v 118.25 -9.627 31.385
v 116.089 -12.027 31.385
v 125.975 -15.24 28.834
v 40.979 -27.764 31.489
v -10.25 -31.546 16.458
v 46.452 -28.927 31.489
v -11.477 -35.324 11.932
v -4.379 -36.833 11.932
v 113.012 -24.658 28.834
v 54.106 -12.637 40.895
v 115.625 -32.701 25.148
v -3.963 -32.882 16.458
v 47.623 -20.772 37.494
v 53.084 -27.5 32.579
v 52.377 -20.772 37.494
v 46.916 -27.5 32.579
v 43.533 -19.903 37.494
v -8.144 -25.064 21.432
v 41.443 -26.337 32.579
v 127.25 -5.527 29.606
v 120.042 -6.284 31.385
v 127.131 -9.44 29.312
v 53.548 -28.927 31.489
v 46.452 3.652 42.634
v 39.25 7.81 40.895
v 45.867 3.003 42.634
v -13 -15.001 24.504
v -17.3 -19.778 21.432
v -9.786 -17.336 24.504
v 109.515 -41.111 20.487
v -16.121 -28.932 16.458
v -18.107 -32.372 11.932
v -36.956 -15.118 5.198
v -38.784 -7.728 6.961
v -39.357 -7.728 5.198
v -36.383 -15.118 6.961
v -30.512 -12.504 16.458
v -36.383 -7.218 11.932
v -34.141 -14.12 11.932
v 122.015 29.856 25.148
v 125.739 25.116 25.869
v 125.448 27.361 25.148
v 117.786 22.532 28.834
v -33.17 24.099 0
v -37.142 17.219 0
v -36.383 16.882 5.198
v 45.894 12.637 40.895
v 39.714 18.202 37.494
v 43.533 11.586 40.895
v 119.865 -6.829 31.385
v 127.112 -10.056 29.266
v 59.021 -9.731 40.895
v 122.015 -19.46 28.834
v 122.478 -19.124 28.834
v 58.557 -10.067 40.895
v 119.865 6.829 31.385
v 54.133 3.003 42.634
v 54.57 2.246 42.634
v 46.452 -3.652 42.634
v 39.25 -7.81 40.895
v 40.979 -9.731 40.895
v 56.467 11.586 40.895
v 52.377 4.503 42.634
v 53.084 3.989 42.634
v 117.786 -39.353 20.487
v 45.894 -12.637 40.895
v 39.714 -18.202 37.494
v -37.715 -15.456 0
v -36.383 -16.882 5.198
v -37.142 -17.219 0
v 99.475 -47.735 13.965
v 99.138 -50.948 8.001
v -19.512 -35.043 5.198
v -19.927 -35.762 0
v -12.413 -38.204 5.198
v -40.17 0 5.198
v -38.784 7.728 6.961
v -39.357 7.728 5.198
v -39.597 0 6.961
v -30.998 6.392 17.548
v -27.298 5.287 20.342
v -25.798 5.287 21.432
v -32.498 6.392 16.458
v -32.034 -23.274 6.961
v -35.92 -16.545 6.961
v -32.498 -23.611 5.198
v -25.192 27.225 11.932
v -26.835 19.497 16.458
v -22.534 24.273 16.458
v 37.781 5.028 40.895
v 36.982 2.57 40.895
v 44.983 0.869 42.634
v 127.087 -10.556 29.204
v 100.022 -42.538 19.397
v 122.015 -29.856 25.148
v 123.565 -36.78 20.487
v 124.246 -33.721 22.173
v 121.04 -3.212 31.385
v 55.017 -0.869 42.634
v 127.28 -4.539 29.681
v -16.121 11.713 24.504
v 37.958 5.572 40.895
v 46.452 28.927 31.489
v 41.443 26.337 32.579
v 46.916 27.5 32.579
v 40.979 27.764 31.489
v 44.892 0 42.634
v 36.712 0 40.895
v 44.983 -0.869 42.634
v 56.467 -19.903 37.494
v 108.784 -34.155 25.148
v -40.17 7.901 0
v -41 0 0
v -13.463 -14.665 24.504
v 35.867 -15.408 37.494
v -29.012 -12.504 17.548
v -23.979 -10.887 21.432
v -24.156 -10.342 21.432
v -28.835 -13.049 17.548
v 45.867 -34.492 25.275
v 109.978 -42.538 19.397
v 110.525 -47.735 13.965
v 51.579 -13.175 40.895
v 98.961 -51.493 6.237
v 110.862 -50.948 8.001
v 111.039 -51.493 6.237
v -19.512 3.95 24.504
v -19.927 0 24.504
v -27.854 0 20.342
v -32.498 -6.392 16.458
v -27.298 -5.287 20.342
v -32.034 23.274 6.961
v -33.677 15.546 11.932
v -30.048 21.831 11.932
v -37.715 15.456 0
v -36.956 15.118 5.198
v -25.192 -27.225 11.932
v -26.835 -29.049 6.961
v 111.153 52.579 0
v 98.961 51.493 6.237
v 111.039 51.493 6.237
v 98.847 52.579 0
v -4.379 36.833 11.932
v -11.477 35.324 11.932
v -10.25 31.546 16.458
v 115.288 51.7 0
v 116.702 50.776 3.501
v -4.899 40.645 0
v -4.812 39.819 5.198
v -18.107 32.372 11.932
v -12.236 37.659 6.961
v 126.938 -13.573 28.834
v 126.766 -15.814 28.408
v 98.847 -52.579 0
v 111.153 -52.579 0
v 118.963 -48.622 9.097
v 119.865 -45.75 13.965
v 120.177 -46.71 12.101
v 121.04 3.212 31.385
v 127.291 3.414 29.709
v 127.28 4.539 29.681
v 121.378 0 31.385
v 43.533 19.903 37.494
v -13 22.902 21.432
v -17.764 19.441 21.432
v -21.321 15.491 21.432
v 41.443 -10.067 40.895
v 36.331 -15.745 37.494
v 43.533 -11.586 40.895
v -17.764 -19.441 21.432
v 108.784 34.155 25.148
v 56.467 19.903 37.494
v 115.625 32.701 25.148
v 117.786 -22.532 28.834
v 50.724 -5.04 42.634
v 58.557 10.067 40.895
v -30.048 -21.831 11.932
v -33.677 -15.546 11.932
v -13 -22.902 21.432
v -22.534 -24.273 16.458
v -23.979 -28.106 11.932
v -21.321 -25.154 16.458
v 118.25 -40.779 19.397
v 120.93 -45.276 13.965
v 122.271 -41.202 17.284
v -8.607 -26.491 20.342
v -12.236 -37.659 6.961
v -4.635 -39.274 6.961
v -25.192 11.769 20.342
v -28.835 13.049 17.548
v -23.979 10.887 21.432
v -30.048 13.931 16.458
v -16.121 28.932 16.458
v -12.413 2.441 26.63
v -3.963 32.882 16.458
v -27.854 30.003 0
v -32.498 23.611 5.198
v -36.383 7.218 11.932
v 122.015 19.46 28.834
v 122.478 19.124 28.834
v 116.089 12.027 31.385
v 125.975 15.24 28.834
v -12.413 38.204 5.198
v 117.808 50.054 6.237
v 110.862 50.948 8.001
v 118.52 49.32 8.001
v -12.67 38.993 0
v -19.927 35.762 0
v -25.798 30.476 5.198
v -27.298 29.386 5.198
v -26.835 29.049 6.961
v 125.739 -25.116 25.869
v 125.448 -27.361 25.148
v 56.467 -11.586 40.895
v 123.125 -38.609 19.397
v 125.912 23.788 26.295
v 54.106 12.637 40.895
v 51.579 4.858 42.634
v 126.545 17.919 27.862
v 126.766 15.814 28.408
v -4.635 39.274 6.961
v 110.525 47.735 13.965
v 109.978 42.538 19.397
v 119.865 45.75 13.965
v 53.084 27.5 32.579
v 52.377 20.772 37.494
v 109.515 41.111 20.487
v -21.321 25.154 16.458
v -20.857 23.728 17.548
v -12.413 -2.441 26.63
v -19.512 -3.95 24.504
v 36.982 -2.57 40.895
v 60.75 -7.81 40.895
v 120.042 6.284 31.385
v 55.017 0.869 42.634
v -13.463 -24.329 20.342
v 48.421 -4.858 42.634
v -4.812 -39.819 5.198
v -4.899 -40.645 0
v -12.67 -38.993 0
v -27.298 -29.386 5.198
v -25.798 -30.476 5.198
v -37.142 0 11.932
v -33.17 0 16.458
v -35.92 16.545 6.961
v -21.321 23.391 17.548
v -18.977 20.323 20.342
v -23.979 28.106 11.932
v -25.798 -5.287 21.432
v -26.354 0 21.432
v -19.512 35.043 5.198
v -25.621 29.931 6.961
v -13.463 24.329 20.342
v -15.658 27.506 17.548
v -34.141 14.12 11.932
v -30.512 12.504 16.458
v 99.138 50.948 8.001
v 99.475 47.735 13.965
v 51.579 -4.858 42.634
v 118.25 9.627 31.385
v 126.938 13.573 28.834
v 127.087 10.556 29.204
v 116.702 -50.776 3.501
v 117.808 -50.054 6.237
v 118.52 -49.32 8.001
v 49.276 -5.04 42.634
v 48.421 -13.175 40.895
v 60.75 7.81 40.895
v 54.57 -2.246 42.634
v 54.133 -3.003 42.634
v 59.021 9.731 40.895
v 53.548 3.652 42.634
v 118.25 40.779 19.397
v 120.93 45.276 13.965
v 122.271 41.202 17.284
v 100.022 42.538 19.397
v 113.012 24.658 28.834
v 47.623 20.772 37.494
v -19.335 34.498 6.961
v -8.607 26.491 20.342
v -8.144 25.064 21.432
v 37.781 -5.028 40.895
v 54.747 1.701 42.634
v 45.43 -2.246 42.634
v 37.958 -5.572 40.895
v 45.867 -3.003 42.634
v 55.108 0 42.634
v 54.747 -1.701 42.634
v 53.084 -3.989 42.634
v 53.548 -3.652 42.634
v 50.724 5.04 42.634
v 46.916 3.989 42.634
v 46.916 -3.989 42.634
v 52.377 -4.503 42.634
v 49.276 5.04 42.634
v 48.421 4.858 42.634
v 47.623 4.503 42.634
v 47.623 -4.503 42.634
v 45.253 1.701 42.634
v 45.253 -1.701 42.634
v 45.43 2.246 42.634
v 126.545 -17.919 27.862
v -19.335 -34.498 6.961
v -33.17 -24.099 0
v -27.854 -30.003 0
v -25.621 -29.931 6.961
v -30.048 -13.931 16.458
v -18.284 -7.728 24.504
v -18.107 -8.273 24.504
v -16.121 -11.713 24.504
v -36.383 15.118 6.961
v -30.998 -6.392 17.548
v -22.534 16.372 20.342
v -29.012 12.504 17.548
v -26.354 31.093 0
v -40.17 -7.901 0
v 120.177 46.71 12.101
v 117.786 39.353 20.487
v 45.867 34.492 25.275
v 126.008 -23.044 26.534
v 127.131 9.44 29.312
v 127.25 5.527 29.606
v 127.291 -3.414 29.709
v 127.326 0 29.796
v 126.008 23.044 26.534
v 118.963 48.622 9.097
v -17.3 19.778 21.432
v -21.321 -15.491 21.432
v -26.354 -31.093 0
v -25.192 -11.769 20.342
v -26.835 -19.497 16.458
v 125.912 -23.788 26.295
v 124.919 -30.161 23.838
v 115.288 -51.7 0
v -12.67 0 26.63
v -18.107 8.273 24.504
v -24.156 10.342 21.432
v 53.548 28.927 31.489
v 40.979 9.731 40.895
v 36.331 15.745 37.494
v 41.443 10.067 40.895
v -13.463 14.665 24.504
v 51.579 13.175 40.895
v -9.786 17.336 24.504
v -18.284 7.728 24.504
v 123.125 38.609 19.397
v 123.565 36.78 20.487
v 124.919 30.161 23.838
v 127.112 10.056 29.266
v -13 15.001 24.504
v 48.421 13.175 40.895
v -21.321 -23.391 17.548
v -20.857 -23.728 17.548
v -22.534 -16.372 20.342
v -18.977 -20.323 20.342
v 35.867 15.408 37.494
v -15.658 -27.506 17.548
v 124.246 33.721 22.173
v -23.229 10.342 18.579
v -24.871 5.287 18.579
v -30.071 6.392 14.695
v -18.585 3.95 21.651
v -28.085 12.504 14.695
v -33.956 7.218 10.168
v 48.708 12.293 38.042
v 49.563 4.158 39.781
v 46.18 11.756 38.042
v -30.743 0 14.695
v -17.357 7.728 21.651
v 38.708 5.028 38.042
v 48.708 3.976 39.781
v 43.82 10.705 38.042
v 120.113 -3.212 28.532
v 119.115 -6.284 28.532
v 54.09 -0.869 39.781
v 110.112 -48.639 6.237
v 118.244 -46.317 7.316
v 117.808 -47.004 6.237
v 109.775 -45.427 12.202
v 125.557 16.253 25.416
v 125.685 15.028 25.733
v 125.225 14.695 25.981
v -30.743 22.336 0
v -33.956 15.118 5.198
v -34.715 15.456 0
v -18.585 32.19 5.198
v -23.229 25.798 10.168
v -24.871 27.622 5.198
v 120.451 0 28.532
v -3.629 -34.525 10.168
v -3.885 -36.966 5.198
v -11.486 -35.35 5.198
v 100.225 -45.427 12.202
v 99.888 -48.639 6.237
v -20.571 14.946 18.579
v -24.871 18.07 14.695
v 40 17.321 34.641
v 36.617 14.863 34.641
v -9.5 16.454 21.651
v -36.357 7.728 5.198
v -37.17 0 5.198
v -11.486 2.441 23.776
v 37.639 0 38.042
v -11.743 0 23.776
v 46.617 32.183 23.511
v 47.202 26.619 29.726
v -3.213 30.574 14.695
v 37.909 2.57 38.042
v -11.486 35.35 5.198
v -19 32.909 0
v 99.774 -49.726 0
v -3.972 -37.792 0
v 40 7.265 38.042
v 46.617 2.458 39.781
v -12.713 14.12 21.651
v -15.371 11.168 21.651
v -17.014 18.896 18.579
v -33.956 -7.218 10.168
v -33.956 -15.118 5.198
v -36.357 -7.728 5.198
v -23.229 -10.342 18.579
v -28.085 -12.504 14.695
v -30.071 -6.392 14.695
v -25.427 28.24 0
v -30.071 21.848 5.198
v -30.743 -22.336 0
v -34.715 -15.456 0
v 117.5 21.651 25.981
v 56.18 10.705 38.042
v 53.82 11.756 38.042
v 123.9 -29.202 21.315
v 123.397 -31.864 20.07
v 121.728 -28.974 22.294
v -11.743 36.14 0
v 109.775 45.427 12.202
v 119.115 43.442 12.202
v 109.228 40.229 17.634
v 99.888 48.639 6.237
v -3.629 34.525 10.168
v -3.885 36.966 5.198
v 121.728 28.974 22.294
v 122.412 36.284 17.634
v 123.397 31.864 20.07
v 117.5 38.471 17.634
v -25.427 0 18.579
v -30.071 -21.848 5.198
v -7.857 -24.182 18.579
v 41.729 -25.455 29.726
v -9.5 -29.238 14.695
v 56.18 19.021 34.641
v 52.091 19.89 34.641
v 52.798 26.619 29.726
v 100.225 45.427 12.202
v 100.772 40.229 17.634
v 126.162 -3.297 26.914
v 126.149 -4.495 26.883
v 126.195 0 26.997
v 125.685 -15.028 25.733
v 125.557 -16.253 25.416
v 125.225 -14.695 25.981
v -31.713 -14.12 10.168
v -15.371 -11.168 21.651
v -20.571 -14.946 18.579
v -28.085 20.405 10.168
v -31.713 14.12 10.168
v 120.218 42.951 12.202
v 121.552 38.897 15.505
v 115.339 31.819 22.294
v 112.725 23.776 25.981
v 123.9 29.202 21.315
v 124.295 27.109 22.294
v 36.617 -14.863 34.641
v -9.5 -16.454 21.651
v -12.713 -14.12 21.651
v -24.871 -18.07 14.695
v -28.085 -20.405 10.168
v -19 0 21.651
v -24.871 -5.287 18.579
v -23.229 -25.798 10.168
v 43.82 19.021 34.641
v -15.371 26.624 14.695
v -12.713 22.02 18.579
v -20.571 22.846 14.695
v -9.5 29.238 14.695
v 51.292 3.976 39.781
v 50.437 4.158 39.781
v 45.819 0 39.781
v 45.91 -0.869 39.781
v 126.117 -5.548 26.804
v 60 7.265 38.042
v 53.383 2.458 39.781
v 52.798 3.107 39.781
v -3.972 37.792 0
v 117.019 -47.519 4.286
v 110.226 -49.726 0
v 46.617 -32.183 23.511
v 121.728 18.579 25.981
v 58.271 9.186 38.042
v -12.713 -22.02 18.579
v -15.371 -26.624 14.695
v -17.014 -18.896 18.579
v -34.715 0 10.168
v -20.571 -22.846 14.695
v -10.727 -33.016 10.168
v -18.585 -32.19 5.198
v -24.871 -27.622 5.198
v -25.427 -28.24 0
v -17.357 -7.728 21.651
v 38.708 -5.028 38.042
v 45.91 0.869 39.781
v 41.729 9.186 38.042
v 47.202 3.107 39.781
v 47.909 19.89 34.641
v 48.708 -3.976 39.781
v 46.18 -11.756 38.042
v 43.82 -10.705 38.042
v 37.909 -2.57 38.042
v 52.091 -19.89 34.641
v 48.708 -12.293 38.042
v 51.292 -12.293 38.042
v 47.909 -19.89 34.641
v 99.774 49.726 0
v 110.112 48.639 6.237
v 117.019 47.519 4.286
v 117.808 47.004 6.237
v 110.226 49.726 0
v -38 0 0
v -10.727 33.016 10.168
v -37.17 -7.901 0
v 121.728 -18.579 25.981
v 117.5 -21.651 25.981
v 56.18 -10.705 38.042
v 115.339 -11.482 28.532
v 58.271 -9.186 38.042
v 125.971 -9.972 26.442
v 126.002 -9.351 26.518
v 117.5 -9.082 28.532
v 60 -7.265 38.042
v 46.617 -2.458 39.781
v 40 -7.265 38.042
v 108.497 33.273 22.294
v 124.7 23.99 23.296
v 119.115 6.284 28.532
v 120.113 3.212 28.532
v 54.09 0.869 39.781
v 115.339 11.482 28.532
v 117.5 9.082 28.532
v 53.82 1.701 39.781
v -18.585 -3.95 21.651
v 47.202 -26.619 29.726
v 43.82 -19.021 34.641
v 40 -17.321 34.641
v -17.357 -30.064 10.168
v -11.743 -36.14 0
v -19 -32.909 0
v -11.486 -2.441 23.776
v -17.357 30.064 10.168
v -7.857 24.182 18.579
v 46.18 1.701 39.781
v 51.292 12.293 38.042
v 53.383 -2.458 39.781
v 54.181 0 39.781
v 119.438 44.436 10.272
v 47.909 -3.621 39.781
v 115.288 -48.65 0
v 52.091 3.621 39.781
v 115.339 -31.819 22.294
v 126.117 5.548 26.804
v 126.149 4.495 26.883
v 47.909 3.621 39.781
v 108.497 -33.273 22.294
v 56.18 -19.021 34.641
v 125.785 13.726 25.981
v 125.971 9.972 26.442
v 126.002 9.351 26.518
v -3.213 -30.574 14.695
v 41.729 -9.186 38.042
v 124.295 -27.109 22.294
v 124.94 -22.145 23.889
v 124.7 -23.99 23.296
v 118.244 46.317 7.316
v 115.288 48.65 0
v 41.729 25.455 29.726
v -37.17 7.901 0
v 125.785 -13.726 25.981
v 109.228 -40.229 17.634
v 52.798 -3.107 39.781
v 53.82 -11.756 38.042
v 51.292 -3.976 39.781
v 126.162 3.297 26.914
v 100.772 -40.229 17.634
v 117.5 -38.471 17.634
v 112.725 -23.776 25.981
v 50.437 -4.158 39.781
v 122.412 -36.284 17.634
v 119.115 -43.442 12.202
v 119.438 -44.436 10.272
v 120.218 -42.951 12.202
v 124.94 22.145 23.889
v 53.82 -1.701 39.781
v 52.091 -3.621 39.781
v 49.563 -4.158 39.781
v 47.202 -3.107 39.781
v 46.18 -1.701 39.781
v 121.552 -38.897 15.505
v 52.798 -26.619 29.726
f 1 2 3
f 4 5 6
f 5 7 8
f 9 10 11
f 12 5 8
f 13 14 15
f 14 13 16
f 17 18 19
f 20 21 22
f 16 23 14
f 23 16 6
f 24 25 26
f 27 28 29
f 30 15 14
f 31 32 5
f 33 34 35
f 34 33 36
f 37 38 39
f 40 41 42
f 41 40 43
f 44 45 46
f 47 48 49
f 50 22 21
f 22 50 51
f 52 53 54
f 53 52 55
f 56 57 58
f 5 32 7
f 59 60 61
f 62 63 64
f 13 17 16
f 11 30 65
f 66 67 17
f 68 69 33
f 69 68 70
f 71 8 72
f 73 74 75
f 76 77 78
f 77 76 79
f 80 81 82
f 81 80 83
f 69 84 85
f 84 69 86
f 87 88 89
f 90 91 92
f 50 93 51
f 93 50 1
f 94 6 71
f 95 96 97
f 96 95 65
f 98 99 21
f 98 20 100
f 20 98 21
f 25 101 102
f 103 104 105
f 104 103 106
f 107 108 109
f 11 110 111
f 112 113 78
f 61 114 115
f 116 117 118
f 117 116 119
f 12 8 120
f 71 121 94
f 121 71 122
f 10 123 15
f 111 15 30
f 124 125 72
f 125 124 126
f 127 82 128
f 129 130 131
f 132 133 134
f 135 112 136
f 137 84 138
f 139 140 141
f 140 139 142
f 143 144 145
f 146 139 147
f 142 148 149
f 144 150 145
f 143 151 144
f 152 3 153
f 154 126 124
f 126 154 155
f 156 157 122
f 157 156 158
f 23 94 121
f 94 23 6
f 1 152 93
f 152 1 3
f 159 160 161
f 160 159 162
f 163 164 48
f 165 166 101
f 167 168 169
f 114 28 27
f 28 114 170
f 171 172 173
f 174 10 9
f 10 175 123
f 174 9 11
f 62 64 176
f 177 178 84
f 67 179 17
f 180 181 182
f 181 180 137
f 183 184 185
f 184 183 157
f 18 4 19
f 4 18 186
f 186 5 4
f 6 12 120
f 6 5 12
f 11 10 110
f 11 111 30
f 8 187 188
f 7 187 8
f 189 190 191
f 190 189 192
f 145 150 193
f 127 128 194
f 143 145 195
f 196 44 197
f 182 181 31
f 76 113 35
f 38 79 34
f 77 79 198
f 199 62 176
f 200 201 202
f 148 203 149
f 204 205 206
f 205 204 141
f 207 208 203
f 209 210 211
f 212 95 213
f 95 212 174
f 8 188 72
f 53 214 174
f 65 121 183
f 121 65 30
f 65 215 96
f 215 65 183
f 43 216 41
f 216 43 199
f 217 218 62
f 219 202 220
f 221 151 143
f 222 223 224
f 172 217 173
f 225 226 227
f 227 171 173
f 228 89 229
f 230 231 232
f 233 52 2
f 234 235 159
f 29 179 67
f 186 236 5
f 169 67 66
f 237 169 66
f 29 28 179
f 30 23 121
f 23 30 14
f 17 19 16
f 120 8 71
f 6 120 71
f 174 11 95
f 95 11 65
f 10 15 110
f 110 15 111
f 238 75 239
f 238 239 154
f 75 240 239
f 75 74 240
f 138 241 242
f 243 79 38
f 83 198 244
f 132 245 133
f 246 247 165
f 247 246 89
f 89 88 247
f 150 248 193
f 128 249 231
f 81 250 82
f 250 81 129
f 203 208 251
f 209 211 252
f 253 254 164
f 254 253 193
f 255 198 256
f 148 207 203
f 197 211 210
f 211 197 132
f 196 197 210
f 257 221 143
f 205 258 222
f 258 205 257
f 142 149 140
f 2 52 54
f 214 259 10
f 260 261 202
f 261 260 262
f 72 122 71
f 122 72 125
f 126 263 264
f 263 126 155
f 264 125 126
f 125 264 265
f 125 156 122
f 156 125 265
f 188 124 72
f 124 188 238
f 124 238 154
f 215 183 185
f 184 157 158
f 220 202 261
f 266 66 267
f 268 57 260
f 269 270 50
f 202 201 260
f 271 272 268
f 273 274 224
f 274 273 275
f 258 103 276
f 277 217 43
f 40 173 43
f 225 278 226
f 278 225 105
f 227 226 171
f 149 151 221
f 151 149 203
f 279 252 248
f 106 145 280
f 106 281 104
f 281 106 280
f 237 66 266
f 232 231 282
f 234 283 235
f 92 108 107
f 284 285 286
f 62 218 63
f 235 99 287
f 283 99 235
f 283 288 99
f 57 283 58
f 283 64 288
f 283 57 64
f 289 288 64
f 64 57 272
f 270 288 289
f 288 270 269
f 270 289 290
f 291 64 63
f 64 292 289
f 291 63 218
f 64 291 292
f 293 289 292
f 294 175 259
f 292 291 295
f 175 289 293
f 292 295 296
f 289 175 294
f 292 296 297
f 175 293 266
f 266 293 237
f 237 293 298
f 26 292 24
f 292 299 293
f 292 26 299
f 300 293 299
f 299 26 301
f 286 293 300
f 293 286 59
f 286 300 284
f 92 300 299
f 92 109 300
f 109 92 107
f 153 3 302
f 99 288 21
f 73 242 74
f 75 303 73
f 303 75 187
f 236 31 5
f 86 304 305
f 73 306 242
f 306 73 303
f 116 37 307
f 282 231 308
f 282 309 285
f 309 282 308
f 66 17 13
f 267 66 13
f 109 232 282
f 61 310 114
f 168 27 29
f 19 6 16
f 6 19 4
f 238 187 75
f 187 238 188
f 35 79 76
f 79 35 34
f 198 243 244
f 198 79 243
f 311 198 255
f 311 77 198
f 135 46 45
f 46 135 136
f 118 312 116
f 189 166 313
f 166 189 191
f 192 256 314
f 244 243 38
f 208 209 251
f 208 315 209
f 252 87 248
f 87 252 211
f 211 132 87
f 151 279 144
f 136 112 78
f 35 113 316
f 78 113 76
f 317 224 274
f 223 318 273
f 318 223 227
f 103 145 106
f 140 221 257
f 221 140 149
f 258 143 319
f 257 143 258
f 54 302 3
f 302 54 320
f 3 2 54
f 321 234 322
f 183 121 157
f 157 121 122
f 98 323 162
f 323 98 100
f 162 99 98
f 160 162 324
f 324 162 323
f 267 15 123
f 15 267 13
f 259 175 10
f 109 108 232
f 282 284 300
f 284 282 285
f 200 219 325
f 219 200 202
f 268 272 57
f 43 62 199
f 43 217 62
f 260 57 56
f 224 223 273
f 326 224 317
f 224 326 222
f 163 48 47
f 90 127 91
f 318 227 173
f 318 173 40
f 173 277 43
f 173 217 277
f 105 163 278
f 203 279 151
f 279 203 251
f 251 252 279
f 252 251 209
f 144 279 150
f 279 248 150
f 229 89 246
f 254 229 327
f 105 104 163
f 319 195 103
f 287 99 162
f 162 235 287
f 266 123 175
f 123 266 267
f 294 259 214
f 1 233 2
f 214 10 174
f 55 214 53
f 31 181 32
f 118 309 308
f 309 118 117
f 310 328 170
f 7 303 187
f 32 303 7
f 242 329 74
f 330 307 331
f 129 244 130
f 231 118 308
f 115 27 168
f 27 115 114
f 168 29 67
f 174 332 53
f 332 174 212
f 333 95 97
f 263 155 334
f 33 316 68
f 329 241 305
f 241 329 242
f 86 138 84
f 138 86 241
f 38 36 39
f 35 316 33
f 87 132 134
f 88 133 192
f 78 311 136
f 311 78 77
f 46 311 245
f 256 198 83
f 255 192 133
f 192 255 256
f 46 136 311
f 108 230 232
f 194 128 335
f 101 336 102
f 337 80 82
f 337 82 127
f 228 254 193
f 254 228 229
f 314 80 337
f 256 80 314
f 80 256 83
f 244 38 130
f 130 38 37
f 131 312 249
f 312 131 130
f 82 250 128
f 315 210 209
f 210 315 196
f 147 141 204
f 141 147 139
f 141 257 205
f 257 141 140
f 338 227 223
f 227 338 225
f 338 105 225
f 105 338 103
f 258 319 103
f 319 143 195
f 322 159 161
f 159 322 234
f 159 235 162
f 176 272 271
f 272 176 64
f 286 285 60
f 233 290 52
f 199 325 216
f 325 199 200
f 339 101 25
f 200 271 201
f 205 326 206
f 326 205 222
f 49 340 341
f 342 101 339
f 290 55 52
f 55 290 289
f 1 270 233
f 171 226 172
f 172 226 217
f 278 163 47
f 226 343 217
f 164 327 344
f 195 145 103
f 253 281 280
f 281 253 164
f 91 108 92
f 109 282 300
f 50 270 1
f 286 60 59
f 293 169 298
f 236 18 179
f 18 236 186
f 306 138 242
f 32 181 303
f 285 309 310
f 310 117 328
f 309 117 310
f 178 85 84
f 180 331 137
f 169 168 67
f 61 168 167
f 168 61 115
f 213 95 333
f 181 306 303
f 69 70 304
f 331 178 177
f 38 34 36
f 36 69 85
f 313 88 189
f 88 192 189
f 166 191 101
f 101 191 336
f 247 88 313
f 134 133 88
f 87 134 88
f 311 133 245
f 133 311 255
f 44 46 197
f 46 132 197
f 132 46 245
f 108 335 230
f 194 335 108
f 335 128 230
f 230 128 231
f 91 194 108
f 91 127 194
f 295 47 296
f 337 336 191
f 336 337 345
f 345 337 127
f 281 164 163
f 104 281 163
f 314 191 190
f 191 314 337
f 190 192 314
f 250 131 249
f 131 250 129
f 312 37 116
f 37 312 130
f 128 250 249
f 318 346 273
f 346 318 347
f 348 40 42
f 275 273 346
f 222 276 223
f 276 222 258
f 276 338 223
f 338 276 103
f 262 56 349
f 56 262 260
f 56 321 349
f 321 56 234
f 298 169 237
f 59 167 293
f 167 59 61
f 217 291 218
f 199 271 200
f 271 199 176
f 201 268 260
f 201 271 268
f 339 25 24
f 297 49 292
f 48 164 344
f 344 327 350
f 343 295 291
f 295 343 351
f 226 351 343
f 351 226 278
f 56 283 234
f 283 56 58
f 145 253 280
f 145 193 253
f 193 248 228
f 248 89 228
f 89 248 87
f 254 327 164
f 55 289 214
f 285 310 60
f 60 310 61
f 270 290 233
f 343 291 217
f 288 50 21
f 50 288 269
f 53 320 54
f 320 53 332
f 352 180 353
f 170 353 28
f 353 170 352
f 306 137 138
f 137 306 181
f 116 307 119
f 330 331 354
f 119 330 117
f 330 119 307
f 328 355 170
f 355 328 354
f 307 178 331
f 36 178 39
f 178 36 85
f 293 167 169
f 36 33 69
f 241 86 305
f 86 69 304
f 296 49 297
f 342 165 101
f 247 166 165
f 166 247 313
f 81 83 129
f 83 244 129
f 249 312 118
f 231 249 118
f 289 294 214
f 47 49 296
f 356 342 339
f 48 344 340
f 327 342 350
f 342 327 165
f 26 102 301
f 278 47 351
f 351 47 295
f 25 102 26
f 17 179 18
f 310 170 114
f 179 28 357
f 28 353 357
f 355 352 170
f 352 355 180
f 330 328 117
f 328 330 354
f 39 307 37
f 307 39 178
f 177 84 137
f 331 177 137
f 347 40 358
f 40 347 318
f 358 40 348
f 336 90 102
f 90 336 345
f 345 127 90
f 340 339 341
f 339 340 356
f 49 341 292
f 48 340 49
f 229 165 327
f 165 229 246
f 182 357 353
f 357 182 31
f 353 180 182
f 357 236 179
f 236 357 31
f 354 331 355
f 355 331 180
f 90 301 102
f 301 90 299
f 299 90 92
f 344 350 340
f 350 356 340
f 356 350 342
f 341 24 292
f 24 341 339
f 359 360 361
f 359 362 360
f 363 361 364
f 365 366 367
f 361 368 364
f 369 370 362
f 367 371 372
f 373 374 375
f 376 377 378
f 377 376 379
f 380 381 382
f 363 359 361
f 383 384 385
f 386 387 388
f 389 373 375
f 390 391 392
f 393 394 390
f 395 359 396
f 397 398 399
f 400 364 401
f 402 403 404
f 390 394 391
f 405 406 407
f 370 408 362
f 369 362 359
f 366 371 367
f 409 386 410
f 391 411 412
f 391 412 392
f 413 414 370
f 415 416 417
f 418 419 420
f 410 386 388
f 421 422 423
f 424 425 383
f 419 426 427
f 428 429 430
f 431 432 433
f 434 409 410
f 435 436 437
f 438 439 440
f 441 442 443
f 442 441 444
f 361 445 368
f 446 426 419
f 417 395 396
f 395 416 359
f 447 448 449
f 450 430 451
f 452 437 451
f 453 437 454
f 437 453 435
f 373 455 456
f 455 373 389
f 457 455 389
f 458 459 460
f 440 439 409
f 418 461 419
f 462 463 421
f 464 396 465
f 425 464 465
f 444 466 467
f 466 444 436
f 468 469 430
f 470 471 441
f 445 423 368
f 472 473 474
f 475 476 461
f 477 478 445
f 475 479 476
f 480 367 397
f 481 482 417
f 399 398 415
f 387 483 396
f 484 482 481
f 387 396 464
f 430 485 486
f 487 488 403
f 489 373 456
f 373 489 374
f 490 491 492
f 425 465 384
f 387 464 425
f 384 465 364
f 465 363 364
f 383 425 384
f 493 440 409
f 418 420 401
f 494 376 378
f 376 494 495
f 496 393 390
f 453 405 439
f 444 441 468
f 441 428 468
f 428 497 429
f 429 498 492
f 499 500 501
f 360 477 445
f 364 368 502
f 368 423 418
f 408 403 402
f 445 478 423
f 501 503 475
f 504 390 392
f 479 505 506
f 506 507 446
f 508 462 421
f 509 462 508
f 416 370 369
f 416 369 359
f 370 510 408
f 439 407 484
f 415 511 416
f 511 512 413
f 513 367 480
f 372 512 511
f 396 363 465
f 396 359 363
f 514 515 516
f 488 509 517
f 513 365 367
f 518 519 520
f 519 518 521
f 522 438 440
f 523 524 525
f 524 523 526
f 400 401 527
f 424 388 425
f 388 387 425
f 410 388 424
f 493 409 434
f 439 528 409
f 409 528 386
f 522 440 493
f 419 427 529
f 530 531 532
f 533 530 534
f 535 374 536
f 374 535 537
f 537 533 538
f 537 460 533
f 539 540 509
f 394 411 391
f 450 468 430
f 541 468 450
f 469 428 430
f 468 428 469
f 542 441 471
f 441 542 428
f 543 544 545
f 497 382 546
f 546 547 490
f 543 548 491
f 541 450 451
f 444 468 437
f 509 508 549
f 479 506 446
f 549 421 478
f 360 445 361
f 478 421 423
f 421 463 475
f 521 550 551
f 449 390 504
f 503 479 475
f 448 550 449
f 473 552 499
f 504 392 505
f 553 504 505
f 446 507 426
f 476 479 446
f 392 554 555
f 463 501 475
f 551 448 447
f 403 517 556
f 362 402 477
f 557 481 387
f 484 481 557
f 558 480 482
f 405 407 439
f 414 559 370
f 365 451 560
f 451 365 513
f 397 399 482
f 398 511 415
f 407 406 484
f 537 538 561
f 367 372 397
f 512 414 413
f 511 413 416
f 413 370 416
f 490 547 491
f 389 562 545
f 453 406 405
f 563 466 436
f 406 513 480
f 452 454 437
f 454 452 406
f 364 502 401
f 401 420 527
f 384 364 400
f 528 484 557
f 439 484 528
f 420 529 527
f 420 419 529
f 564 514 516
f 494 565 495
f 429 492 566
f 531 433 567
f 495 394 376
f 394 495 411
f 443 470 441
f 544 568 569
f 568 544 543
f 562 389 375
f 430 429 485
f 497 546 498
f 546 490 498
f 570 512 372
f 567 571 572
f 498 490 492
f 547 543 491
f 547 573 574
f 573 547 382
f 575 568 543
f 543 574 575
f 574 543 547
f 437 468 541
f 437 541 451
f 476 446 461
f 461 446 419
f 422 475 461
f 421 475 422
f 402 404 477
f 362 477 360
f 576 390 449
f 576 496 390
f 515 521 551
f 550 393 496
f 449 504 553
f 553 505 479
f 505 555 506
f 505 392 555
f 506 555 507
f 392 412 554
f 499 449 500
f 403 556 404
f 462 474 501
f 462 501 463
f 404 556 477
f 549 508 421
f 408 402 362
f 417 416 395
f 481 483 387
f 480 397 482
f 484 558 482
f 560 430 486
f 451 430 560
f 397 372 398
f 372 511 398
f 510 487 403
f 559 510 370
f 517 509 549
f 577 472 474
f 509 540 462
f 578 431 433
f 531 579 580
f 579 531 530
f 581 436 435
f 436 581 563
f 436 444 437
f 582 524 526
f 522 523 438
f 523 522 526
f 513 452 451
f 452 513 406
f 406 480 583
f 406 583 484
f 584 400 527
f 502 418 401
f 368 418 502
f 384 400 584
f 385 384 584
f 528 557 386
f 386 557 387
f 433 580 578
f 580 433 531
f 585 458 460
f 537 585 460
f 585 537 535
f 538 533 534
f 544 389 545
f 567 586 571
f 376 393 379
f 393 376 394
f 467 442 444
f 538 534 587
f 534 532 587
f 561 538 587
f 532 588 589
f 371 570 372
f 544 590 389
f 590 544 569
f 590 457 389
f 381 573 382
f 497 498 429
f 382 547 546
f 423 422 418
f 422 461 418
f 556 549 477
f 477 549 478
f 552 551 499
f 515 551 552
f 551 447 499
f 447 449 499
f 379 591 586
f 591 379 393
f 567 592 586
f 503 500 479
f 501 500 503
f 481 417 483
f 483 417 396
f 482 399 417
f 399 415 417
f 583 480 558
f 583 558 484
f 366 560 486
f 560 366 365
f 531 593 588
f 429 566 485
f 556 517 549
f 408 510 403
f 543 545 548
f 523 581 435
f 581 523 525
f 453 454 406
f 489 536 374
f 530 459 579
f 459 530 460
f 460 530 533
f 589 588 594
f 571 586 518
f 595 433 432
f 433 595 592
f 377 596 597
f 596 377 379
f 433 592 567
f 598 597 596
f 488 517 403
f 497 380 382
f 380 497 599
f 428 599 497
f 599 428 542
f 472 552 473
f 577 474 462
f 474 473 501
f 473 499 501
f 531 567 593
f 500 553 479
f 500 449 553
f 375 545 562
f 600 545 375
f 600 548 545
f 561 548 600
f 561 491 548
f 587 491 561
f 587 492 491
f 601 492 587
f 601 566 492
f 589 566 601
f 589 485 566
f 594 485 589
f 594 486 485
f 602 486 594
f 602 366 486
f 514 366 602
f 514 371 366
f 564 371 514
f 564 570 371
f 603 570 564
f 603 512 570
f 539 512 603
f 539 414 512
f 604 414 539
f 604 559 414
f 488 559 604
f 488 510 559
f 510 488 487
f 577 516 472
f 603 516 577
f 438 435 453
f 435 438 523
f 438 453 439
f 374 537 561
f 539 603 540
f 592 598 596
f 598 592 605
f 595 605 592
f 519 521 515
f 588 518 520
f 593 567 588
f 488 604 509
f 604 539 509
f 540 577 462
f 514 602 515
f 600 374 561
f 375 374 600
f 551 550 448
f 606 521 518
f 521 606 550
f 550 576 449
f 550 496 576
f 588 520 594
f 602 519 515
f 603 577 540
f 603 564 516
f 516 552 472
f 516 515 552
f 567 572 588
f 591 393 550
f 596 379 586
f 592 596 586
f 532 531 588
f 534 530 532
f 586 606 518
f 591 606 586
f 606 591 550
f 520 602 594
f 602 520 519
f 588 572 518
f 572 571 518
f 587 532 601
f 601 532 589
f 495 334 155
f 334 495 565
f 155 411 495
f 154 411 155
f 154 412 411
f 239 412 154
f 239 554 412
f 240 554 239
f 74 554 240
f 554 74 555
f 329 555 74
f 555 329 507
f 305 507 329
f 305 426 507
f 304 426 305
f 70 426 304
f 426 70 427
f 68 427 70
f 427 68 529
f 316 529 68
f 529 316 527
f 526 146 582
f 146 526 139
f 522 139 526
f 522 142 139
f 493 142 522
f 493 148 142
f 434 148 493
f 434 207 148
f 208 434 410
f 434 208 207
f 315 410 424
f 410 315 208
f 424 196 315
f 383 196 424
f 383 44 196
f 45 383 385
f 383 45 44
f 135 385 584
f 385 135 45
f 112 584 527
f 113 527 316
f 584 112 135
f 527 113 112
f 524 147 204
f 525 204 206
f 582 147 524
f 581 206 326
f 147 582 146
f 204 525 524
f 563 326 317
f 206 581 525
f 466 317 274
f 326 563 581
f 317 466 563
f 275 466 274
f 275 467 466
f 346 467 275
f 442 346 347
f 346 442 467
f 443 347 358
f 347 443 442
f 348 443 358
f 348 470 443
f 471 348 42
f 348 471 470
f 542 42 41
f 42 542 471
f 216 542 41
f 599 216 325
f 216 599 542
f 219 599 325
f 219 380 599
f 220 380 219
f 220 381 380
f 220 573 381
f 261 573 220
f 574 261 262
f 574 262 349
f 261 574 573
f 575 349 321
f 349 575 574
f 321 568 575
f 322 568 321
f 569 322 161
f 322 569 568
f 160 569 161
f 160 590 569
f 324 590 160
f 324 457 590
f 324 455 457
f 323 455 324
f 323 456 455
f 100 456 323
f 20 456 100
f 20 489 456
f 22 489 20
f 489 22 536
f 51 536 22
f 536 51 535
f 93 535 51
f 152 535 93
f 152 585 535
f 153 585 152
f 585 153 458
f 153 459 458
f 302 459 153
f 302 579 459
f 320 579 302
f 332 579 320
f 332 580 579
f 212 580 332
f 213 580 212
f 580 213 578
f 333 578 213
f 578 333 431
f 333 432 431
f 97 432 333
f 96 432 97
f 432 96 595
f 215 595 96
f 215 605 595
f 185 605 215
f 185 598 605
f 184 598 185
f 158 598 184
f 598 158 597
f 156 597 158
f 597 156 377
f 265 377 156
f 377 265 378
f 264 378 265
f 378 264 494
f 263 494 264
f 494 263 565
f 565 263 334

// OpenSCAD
function tot_dist(arr, index) = index == 0 ? arr[index] : arr[index] + tot_dist(arr, index-1);


module finger(seg_wid, seg_dist, seg_ht) {
    if(is_list(seg_wid) && 
        is_list(seg_dist) && 
        is_list(seg_ht) &&
        len(seg_wid) == len(seg_ht) &&
        len(seg_dist) == len(seg_ht) -1) {
            
          hull(){
            difference() {
               union() {
                   for(i=[0:1:len(seg_wid) -1]) {
                       if (i!=0) {
                           translate([tot_dist(seg_dist, i-1),0,0])
                           scale([1,1,seg_ht[i]/seg_wid[i]])
                           sphere(r=seg_wid[i], center=true);
                       } else {
                           scale([1,1,seg_ht[i]/seg_wid[i]])
                           sphere(r=seg_wid[i], center=true);
                       };  
                   }
                };
           }
               
           }
            
     } else {
         echo("bad parameters");
     }

}

module shell(thickness=1.5) {
    difference() {
        minkowski() {
            children(0);
            sphere(r=thickness, center=true);
        }
        children(0);
    };

}




difference() {
shell(3){   
finger(seg_wid=[38,40,50], seg_dist=[50,55], seg_ht=[25,40,30]);
};
translate([0,0,-500])
    cube(1000, center= true);

translate([180,0,0])
rotate(a=22, v=[0,1,0])
    cube([120,120 ,100], center=true);
}
